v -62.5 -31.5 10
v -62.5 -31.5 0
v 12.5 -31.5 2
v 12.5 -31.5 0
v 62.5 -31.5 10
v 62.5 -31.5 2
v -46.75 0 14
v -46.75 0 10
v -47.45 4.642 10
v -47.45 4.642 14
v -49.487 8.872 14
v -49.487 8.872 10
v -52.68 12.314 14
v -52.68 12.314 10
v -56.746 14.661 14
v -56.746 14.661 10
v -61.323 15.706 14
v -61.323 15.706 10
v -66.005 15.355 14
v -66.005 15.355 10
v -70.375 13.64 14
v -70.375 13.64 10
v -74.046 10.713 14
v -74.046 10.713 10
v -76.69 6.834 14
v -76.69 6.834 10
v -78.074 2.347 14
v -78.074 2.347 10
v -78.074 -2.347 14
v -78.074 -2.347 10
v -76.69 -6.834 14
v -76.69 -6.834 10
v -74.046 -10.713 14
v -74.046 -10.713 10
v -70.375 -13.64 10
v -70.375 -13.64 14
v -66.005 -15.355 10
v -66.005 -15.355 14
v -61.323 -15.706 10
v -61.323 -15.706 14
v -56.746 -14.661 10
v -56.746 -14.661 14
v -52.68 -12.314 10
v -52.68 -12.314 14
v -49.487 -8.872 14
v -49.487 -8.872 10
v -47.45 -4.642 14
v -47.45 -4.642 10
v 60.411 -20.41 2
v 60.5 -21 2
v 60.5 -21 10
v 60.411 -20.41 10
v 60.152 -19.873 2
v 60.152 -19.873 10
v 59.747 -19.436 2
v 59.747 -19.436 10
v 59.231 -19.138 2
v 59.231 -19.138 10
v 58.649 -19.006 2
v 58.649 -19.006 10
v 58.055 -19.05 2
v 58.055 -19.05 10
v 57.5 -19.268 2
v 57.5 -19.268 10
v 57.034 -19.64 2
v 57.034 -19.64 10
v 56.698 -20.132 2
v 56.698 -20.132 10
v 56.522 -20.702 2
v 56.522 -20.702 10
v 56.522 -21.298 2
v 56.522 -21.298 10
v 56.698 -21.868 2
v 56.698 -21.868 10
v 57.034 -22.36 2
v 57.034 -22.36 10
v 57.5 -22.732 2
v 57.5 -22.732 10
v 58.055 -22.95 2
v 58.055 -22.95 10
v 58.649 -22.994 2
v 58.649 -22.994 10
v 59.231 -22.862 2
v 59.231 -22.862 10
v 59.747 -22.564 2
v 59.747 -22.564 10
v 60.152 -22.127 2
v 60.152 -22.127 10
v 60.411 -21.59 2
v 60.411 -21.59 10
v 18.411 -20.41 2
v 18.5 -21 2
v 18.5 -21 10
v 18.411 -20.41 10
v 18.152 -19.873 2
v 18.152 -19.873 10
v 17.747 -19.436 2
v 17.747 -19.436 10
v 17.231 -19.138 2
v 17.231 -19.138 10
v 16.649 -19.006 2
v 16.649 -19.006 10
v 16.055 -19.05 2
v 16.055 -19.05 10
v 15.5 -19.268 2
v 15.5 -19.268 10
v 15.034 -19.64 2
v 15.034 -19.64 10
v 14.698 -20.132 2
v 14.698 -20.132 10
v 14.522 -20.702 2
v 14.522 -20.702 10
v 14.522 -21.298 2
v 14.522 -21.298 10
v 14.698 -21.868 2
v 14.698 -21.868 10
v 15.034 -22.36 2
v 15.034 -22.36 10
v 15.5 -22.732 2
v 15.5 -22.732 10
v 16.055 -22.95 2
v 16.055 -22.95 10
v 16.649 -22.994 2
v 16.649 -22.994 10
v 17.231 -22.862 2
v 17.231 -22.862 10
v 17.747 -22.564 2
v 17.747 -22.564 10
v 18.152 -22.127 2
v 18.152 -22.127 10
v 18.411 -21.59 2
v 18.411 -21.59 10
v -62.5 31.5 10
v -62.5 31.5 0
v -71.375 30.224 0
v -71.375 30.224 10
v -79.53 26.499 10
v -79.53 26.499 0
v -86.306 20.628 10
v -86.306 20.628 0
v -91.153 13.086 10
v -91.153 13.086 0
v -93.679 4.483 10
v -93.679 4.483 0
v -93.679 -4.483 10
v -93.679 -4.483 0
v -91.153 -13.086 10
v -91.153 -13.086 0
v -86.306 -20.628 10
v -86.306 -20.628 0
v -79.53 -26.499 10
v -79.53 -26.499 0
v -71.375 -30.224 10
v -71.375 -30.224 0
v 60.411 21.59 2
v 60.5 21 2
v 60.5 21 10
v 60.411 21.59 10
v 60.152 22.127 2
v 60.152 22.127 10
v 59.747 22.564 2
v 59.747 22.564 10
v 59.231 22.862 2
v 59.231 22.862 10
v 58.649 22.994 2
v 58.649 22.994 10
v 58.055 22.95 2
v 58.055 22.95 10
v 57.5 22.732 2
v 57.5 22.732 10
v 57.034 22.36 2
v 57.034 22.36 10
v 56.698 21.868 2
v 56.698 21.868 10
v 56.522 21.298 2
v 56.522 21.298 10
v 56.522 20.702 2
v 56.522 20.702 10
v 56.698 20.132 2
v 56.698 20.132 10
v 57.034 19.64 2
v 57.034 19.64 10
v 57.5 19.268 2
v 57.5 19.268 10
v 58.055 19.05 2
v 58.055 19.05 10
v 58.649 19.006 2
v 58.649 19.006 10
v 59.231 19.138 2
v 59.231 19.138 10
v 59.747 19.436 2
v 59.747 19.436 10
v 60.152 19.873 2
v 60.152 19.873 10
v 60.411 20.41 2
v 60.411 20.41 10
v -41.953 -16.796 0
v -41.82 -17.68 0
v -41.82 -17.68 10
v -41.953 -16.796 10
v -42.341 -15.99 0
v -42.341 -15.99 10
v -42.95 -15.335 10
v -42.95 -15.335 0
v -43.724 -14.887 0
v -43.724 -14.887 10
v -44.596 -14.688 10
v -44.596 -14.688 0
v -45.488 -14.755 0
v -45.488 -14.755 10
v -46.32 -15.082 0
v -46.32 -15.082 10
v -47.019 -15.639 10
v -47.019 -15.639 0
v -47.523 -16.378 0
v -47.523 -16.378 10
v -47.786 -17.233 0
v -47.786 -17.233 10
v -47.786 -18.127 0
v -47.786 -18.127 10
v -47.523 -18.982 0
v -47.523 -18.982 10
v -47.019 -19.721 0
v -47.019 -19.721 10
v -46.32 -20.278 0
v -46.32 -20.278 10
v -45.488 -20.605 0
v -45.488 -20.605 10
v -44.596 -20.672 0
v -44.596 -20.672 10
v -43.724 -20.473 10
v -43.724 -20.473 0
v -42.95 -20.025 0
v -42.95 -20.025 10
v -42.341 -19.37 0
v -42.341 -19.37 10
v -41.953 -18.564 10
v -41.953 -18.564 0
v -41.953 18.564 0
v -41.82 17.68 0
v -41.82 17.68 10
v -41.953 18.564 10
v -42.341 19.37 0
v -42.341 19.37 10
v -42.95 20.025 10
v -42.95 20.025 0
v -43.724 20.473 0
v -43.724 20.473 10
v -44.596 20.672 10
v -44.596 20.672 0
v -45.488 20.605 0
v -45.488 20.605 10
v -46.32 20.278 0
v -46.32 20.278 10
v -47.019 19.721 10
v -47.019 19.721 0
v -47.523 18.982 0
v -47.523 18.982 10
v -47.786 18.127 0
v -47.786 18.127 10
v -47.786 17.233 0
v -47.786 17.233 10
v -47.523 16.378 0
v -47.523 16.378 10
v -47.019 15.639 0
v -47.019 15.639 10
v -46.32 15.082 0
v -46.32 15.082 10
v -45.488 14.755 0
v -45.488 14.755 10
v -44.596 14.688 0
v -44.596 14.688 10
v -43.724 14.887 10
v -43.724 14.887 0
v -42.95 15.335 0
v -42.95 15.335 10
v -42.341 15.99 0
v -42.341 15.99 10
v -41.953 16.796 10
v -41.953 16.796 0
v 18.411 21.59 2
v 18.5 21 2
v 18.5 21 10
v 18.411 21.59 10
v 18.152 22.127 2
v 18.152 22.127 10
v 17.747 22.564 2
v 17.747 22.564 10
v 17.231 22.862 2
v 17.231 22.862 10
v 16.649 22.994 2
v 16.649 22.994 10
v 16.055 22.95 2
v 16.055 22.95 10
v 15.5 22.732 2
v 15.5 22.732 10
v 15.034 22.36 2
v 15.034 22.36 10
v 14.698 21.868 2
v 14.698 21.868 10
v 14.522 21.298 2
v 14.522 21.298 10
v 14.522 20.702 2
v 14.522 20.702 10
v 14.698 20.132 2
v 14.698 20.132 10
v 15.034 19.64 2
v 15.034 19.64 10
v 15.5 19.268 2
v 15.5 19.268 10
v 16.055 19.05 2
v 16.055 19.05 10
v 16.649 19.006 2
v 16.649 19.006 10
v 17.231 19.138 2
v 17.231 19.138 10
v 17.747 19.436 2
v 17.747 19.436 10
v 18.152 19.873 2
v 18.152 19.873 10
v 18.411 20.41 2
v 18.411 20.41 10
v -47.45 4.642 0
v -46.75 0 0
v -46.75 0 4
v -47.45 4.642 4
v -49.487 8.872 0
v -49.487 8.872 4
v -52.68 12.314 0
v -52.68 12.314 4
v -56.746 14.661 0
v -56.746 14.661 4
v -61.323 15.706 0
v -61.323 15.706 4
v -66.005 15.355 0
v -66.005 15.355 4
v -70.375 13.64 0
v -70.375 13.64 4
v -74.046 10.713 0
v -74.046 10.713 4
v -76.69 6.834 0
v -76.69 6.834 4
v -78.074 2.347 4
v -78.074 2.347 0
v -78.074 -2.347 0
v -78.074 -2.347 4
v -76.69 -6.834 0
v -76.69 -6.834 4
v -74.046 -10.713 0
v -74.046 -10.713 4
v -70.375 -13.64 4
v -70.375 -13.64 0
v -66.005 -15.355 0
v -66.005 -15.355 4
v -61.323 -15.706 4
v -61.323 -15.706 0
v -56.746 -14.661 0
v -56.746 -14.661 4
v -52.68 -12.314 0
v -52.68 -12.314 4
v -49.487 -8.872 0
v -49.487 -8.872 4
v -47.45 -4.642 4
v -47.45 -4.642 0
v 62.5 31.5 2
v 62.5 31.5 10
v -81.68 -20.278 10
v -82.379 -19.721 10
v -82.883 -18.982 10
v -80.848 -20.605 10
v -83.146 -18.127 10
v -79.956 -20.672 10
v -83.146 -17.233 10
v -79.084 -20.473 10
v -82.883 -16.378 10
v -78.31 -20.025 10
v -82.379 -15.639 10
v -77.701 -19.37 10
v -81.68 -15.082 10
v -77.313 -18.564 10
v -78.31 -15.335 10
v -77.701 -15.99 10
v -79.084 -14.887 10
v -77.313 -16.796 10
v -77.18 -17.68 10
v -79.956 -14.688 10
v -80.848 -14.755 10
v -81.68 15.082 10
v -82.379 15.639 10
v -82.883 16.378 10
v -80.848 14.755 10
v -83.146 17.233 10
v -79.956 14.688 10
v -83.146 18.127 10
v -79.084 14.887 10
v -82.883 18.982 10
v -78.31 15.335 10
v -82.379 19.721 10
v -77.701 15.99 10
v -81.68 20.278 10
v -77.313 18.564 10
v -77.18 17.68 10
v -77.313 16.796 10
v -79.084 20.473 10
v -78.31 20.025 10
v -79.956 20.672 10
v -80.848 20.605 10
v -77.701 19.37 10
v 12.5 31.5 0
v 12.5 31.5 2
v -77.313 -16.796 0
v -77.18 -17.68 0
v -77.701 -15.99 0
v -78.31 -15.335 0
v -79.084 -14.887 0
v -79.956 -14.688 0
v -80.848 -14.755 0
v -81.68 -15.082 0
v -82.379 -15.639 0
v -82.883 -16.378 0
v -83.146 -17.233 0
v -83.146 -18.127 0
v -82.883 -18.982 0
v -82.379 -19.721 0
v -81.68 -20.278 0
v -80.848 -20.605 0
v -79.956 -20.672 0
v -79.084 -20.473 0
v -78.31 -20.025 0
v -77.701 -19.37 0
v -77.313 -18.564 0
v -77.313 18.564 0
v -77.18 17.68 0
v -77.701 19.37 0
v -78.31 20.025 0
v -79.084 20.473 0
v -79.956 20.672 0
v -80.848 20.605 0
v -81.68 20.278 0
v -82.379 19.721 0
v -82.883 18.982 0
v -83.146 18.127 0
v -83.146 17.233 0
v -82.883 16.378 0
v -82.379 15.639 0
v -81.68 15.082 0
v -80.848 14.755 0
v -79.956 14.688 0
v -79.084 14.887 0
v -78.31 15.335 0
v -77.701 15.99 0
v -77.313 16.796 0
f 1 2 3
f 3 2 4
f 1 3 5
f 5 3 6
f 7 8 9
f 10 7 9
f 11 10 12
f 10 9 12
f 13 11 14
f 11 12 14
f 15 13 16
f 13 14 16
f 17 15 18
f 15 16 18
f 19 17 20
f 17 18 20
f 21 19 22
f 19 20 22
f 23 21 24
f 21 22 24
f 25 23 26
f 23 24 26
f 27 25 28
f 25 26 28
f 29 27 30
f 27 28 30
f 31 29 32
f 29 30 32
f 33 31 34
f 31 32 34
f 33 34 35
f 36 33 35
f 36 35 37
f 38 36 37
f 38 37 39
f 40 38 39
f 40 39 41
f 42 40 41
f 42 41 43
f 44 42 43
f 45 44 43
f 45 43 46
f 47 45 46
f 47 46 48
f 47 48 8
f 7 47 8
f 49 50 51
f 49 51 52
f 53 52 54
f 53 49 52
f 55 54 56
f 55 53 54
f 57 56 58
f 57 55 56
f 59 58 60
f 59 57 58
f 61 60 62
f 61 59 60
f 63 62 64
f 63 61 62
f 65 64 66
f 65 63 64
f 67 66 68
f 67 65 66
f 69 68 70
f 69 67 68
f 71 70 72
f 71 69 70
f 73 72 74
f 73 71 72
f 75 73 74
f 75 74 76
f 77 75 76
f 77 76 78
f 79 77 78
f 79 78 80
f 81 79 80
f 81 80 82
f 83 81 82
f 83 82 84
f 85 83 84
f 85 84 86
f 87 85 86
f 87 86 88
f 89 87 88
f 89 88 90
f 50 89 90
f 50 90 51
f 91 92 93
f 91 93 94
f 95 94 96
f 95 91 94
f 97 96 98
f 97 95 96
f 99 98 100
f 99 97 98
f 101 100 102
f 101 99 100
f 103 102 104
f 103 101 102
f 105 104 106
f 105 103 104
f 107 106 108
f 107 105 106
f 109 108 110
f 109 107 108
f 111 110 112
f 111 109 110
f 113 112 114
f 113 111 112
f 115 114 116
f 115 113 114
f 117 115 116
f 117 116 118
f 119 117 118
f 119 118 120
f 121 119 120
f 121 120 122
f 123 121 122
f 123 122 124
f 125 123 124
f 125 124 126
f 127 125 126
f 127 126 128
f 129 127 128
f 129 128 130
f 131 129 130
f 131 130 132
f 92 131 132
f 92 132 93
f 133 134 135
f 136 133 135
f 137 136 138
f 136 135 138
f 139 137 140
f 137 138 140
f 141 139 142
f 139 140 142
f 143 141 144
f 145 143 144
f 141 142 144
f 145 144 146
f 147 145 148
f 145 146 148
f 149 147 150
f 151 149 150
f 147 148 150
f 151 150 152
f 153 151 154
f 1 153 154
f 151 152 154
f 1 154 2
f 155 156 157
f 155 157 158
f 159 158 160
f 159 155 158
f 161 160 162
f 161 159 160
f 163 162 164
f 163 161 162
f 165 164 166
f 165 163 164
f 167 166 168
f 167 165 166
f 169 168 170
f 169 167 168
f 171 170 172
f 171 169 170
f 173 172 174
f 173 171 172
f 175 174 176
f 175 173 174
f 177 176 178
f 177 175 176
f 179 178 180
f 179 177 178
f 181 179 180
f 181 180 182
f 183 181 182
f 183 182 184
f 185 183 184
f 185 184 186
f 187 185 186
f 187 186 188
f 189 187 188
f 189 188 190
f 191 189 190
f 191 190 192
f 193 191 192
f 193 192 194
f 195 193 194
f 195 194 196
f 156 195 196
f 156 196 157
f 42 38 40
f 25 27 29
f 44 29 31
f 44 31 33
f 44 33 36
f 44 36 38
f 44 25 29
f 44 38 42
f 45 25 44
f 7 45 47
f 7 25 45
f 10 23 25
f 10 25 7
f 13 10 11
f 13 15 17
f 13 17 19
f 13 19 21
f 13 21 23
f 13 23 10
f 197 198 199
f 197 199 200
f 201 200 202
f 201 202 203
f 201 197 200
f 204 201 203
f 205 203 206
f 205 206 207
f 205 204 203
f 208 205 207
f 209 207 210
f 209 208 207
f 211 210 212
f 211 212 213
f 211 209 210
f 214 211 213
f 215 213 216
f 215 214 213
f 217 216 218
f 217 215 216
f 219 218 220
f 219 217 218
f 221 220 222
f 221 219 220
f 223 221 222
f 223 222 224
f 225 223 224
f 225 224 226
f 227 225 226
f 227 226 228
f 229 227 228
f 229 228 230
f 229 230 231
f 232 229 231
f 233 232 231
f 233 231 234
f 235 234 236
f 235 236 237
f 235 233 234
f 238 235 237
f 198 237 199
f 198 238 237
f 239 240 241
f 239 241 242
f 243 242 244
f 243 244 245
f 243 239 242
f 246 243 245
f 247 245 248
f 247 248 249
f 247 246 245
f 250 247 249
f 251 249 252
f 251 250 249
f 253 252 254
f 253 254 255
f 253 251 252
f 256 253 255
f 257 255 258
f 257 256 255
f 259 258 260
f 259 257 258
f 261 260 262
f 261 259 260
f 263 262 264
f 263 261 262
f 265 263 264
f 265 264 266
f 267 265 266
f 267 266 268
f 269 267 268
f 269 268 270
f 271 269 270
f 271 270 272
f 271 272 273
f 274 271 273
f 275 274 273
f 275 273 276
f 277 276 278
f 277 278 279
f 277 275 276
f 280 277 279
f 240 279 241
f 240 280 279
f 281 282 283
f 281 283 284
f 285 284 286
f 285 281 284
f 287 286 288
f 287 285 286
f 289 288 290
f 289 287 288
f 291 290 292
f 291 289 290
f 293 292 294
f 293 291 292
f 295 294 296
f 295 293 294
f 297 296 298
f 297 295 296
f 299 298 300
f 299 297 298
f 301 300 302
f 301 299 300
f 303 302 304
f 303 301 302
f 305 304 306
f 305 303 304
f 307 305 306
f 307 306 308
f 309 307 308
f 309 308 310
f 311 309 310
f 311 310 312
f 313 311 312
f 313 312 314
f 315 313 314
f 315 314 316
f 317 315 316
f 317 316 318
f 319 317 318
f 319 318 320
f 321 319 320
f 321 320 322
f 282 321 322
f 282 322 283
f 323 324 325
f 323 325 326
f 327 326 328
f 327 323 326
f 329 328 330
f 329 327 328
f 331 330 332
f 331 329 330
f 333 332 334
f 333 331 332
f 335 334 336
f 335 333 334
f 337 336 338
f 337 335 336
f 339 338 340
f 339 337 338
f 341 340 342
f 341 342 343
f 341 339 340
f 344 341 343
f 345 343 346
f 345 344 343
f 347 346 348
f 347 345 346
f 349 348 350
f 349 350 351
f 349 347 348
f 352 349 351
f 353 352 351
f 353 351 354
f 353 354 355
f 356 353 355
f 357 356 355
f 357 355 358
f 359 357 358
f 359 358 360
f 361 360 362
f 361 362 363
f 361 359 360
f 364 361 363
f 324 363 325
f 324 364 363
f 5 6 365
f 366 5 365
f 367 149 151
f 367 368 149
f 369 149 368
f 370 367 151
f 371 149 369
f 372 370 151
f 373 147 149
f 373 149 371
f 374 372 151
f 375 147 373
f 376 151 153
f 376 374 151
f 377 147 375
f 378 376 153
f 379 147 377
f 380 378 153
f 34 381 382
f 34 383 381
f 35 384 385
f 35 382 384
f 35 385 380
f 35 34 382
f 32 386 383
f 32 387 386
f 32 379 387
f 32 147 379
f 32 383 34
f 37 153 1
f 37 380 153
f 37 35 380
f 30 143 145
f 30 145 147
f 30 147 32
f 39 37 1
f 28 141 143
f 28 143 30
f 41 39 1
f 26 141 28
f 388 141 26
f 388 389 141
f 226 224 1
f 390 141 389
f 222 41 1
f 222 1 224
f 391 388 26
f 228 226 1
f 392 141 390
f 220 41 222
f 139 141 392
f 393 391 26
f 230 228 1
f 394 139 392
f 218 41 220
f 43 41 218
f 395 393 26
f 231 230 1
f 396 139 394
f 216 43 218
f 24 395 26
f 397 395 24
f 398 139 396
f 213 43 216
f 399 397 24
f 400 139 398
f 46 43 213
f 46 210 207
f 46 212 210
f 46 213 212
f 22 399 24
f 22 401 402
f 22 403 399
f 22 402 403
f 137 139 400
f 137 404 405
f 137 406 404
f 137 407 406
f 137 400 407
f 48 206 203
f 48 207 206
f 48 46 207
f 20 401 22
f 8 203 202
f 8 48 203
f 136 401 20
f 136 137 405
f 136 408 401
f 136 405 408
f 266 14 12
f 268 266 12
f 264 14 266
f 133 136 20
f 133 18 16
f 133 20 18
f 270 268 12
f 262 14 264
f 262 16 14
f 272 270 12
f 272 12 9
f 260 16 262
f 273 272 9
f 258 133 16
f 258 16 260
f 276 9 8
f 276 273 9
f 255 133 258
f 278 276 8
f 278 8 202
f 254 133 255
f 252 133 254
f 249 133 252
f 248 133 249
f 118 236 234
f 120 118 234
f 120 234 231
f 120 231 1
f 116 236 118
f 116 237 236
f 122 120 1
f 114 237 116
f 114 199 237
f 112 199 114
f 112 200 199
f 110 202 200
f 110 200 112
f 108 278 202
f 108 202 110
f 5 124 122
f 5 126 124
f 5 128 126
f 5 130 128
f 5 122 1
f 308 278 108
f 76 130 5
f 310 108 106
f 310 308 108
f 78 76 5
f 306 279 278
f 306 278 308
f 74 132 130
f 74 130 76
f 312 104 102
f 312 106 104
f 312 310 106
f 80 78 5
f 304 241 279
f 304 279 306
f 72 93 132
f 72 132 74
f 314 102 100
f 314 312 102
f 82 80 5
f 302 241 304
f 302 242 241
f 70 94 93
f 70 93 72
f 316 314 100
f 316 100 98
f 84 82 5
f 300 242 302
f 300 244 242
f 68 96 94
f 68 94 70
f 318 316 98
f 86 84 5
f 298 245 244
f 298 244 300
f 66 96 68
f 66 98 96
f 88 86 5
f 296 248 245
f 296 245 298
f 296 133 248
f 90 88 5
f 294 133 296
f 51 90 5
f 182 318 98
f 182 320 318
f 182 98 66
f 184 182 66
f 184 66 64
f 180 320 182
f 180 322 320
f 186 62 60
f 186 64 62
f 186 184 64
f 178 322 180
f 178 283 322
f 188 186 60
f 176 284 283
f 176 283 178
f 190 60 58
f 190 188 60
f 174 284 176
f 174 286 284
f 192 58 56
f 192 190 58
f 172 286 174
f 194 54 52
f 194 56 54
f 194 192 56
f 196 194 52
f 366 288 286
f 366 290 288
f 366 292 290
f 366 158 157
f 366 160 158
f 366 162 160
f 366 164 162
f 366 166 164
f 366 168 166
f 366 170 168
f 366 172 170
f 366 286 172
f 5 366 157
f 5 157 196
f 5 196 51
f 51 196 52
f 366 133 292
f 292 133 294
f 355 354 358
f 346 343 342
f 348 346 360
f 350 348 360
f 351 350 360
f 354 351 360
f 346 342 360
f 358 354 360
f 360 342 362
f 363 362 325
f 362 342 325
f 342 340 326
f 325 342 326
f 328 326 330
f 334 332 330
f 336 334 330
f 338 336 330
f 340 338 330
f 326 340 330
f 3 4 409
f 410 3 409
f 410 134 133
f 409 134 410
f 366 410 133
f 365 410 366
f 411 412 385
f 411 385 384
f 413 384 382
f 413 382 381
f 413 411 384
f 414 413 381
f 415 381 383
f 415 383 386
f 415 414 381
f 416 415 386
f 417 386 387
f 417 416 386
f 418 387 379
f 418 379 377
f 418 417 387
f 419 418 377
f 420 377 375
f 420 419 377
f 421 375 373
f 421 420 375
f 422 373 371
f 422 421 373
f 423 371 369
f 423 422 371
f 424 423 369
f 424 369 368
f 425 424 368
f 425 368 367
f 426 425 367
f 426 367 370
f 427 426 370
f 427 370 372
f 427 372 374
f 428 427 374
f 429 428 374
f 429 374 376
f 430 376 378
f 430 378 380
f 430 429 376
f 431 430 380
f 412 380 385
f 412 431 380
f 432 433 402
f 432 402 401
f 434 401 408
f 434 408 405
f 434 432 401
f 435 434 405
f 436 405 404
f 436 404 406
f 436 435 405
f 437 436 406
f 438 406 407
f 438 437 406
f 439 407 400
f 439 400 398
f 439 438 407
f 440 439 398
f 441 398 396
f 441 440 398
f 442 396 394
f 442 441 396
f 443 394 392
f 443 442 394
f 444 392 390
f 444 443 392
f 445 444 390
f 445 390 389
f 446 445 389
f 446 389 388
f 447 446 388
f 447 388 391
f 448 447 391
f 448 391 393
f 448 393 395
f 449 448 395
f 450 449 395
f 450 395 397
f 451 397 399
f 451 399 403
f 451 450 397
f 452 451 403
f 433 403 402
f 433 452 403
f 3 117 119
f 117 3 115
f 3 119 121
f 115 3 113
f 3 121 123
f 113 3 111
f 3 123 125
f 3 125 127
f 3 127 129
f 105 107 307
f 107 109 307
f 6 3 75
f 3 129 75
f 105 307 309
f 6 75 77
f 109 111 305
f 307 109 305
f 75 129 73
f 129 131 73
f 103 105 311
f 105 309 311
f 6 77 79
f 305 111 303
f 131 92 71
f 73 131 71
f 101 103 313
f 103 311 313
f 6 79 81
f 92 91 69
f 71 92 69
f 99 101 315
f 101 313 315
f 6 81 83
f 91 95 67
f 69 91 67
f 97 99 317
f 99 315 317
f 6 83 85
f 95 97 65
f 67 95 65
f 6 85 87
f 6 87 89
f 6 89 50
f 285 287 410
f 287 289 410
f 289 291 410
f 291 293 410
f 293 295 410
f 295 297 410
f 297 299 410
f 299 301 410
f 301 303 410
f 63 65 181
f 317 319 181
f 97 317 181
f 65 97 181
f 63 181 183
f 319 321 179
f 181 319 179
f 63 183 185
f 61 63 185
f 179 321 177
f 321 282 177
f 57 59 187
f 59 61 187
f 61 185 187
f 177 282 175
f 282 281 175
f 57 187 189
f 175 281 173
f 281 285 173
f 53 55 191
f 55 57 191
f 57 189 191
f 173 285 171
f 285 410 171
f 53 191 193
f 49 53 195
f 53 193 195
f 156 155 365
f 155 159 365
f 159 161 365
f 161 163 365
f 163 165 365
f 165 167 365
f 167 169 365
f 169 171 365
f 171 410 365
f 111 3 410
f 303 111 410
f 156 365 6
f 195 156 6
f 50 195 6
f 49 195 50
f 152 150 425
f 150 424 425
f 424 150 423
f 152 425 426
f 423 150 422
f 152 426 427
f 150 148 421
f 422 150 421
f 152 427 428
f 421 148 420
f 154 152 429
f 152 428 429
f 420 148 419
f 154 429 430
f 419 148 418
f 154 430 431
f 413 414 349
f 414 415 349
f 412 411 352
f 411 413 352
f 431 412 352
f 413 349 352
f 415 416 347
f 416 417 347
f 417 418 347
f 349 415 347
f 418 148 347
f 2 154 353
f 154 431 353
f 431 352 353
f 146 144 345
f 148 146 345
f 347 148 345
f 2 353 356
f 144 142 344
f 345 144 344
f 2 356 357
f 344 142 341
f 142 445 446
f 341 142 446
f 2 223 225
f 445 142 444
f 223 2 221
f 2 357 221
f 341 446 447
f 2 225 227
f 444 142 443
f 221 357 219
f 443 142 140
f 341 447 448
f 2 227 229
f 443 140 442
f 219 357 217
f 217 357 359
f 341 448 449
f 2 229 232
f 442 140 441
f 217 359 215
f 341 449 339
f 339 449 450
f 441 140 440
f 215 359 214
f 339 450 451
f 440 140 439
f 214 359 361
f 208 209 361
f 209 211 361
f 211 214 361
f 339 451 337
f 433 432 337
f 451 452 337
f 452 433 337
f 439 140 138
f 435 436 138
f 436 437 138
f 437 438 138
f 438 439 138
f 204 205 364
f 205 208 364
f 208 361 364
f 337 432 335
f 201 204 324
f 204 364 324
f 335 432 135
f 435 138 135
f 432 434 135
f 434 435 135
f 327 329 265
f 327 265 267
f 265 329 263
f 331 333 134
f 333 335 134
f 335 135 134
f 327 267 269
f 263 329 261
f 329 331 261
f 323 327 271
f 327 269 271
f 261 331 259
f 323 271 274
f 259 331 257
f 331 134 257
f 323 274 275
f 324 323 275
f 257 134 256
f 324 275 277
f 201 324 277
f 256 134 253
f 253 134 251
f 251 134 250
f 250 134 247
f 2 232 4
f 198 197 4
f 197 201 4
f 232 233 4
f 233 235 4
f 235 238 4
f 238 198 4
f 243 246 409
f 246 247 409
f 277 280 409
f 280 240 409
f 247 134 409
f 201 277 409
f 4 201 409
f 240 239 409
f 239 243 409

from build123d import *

# Parameters (mm, degrees)
F0_R     = 3
F0_R_2   = 15.75
F1_DEPTH = 10
F2_DEPTH = 14
F0_W     = 50
F0_H     = 63
F0_R_3   = 2
F3_DEPTH = 10
F4_DEPTH = 4
F5_DEPTH = 2


with BuildPart() as f1:
    # F0 (on Top) → F1 (new body)
    with BuildSketch(Plane.XY):
        with BuildLine():
            Line((-62.5, -31.5), (12.5, -31.5))
            Line((12.5, -31.5), (12.5, 31.5))
            Line((12.5, 31.5), (-62.5, 31.5))
            ThreePointArc((-62.5, 31.5), (-94, 0), (-62.5, -31.5))
        make_face()
        with Locations((-80.18, -17.68)):
            Circle(F0_R, mode=Mode.SUBTRACT)
        with Locations((-44.82, -17.68)):
            Circle(F0_R, mode=Mode.SUBTRACT)
        with Locations((-62.5, 0)):
            Circle(F0_R_2, mode=Mode.SUBTRACT)
        with Locations((-80.18, 17.68)):
            Circle(F0_R, mode=Mode.SUBTRACT)
        with Locations((-44.82, 17.68)):
            Circle(F0_R, mode=Mode.SUBTRACT)
    extrude(amount=F1_DEPTH)

    # F0 (on Top) → F2 (join)
    with BuildSketch(Plane.XY):
        with Locations((-62.5, 0)):
            Circle(F0_R_2)
    extrude(amount=F2_DEPTH)

    # F0 (on Top) → F3 (join)
    with BuildSketch(Plane.XY):
        with Locations((37.5, 0)):
            Rectangle(F0_W, F0_H)
        with Locations((16.5, -21)):
            Circle(F0_R_3, mode=Mode.SUBTRACT)
        with Locations((58.5, -21)):
            Circle(F0_R_3, mode=Mode.SUBTRACT)
        with Locations((16.5, 21)):
            Circle(F0_R_3, mode=Mode.SUBTRACT)
        with Locations((58.5, 21)):
            Circle(F0_R_3, mode=Mode.SUBTRACT)
    extrude(amount=F3_DEPTH)

    # F0 (on Top) → F4 (cut)
    with BuildSketch(Plane.XY):
        with Locations((-62.5, 0)):
            Circle(F0_R_2)
    extrude(amount=F4_DEPTH, mode=Mode.SUBTRACT)

    # F0 (on Top) → F5 (cut)
    with BuildSketch(Plane.XY):
        with Locations((37.5, 0)):
            Rectangle(F0_W, F0_H)
        with Locations((16.5, -21)):
            Circle(F0_R_3, mode=Mode.SUBTRACT)
        with Locations((58.5, -21)):
            Circle(F0_R_3, mode=Mode.SUBTRACT)
        with Locations((16.5, 21)):
            Circle(F0_R_3, mode=Mode.SUBTRACT)
        with Locations((58.5, 21)):
            Circle(F0_R_3, mode=Mode.SUBTRACT)
    extrude(amount=F5_DEPTH, mode=Mode.SUBTRACT)


solid = f1.part
